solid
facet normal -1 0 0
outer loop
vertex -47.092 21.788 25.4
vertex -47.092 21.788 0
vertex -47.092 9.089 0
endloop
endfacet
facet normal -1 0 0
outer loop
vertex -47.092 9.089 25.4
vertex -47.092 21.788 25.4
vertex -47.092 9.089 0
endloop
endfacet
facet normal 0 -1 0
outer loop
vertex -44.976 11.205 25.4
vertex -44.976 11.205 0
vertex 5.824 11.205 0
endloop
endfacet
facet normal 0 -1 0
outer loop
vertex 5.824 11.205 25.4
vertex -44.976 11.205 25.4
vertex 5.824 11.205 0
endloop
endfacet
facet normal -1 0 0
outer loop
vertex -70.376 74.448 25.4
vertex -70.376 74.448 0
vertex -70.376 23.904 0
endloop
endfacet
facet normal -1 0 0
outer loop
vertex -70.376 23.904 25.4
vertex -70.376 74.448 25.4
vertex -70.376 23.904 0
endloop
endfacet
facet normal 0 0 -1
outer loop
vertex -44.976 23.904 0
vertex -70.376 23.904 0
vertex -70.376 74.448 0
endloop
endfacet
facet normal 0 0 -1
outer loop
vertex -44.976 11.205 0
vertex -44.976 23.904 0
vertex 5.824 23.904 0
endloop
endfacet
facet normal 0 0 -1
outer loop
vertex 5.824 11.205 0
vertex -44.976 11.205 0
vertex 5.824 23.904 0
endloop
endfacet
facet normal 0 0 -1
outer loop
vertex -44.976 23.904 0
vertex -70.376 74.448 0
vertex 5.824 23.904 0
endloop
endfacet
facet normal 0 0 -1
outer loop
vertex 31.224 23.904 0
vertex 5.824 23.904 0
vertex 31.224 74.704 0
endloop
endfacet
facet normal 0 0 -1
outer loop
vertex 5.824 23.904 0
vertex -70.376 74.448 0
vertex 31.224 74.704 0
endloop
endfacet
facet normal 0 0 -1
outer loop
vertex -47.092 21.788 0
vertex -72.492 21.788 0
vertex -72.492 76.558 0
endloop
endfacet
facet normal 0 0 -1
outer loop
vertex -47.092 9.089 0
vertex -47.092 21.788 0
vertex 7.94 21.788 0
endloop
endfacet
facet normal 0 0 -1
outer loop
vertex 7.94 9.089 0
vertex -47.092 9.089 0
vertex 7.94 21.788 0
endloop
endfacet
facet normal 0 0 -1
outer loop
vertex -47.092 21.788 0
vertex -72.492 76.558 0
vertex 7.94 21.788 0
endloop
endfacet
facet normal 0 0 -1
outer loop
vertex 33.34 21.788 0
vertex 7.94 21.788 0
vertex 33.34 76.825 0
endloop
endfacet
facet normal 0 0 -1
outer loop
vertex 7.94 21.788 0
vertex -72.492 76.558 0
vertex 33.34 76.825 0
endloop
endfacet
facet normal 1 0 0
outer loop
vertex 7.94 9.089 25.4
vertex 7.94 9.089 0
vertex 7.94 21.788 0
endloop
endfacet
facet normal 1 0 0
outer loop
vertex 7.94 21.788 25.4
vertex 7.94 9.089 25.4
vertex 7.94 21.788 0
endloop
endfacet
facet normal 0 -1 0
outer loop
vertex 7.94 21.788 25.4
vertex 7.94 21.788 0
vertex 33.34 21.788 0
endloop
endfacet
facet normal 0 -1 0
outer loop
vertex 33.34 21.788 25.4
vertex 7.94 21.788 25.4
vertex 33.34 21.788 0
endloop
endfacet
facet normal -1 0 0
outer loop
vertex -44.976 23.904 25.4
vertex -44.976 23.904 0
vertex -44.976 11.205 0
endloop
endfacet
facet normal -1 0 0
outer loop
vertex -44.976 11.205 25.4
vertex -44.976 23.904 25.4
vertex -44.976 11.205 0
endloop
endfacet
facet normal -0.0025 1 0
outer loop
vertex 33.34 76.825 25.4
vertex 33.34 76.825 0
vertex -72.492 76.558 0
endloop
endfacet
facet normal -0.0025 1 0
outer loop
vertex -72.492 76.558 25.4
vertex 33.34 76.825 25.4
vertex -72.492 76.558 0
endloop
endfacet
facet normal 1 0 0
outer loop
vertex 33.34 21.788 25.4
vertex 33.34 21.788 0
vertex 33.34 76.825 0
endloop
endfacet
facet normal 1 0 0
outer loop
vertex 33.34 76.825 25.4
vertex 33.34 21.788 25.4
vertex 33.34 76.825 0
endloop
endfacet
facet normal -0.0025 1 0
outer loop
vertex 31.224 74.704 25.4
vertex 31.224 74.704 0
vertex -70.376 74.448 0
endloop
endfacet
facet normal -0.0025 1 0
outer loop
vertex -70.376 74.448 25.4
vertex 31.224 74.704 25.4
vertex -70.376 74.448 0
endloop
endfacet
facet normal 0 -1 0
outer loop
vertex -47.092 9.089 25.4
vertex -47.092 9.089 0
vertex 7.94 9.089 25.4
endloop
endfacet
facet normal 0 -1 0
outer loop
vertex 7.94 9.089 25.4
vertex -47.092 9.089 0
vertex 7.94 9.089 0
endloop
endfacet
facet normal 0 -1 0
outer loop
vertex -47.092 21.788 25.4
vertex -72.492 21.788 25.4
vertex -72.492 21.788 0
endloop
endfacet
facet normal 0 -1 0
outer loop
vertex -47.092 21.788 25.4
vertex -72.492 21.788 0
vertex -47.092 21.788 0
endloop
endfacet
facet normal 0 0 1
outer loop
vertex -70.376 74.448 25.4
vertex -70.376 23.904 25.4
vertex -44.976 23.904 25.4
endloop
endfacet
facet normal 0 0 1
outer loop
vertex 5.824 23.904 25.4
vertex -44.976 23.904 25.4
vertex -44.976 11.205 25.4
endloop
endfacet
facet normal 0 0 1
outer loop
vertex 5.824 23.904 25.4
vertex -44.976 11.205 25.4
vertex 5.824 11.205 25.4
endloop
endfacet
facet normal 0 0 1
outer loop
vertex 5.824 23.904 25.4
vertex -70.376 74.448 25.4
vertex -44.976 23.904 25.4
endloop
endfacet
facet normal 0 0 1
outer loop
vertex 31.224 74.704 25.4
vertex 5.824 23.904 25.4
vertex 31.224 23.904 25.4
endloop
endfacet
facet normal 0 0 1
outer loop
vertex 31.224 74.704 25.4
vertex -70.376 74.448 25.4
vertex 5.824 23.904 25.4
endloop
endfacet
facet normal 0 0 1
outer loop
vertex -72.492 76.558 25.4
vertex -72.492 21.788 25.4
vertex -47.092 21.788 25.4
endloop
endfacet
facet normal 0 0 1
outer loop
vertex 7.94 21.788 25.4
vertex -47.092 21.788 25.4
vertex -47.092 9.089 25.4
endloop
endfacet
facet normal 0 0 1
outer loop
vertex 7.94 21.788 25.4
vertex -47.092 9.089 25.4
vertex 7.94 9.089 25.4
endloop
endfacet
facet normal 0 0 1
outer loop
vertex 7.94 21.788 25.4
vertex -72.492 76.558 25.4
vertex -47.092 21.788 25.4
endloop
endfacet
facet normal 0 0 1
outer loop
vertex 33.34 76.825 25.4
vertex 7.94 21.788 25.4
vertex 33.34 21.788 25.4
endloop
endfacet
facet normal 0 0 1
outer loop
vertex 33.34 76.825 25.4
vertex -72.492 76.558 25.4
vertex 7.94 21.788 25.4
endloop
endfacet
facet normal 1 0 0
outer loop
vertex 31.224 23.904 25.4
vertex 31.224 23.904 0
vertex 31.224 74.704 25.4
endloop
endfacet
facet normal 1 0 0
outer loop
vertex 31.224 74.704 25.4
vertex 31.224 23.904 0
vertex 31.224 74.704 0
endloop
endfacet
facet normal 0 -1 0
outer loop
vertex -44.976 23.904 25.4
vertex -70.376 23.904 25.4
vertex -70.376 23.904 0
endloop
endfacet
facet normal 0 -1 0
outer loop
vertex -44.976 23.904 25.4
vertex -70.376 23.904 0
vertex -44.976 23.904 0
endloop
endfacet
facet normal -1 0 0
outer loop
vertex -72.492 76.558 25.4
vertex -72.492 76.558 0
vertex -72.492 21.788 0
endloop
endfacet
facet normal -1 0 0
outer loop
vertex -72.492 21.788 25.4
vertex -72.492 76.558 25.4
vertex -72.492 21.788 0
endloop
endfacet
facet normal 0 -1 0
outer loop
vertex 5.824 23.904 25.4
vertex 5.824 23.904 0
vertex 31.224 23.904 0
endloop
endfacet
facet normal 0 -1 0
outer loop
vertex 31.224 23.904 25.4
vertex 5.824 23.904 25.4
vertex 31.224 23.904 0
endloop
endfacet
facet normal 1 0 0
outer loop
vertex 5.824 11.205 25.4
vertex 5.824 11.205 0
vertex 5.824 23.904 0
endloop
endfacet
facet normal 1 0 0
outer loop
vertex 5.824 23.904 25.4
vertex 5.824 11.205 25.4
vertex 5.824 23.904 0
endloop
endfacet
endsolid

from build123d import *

# Parameters (mm, degrees)
F2_DEPTH = 25.4


with BuildPart() as f2:
    # F1 (on Top) → F2 (new body)
    with BuildSketch(Plane.XY):
        Polygon((7.9396317849, 21.7884753897), (33.3396317849, 21.7884753897), (33.3396317849, 76.8254651894), (-72.4920082151, 76.5582098941), (-72.4920082151, 21.7884753897), (-47.0920082151, 21.7884753897), (-47.0920082151, 9.0889833897), (7.9396317849, 9.0889833897), align=None)
    extrude(amount=F2_DEPTH)


with BuildPart() as f2b:
    # F0 (on Top) → F2, piece 2 (new body)
    with BuildSketch(Plane.XY):
        Polygon((31.2238117849, 74.7042953897), (-70.3761882151, 74.4477262011), (-70.3761882151, 23.9042953897), (-44.9761882151, 23.9042953897), (-44.9761882151, 11.2048033897), (5.8238117849, 11.2048033897), (5.8238117849, 23.9042953897), (31.2238117849, 23.9042953897), align=None)
    extrude(amount=F2_DEPTH)


solid = Compound([f2.part, f2b.part])
